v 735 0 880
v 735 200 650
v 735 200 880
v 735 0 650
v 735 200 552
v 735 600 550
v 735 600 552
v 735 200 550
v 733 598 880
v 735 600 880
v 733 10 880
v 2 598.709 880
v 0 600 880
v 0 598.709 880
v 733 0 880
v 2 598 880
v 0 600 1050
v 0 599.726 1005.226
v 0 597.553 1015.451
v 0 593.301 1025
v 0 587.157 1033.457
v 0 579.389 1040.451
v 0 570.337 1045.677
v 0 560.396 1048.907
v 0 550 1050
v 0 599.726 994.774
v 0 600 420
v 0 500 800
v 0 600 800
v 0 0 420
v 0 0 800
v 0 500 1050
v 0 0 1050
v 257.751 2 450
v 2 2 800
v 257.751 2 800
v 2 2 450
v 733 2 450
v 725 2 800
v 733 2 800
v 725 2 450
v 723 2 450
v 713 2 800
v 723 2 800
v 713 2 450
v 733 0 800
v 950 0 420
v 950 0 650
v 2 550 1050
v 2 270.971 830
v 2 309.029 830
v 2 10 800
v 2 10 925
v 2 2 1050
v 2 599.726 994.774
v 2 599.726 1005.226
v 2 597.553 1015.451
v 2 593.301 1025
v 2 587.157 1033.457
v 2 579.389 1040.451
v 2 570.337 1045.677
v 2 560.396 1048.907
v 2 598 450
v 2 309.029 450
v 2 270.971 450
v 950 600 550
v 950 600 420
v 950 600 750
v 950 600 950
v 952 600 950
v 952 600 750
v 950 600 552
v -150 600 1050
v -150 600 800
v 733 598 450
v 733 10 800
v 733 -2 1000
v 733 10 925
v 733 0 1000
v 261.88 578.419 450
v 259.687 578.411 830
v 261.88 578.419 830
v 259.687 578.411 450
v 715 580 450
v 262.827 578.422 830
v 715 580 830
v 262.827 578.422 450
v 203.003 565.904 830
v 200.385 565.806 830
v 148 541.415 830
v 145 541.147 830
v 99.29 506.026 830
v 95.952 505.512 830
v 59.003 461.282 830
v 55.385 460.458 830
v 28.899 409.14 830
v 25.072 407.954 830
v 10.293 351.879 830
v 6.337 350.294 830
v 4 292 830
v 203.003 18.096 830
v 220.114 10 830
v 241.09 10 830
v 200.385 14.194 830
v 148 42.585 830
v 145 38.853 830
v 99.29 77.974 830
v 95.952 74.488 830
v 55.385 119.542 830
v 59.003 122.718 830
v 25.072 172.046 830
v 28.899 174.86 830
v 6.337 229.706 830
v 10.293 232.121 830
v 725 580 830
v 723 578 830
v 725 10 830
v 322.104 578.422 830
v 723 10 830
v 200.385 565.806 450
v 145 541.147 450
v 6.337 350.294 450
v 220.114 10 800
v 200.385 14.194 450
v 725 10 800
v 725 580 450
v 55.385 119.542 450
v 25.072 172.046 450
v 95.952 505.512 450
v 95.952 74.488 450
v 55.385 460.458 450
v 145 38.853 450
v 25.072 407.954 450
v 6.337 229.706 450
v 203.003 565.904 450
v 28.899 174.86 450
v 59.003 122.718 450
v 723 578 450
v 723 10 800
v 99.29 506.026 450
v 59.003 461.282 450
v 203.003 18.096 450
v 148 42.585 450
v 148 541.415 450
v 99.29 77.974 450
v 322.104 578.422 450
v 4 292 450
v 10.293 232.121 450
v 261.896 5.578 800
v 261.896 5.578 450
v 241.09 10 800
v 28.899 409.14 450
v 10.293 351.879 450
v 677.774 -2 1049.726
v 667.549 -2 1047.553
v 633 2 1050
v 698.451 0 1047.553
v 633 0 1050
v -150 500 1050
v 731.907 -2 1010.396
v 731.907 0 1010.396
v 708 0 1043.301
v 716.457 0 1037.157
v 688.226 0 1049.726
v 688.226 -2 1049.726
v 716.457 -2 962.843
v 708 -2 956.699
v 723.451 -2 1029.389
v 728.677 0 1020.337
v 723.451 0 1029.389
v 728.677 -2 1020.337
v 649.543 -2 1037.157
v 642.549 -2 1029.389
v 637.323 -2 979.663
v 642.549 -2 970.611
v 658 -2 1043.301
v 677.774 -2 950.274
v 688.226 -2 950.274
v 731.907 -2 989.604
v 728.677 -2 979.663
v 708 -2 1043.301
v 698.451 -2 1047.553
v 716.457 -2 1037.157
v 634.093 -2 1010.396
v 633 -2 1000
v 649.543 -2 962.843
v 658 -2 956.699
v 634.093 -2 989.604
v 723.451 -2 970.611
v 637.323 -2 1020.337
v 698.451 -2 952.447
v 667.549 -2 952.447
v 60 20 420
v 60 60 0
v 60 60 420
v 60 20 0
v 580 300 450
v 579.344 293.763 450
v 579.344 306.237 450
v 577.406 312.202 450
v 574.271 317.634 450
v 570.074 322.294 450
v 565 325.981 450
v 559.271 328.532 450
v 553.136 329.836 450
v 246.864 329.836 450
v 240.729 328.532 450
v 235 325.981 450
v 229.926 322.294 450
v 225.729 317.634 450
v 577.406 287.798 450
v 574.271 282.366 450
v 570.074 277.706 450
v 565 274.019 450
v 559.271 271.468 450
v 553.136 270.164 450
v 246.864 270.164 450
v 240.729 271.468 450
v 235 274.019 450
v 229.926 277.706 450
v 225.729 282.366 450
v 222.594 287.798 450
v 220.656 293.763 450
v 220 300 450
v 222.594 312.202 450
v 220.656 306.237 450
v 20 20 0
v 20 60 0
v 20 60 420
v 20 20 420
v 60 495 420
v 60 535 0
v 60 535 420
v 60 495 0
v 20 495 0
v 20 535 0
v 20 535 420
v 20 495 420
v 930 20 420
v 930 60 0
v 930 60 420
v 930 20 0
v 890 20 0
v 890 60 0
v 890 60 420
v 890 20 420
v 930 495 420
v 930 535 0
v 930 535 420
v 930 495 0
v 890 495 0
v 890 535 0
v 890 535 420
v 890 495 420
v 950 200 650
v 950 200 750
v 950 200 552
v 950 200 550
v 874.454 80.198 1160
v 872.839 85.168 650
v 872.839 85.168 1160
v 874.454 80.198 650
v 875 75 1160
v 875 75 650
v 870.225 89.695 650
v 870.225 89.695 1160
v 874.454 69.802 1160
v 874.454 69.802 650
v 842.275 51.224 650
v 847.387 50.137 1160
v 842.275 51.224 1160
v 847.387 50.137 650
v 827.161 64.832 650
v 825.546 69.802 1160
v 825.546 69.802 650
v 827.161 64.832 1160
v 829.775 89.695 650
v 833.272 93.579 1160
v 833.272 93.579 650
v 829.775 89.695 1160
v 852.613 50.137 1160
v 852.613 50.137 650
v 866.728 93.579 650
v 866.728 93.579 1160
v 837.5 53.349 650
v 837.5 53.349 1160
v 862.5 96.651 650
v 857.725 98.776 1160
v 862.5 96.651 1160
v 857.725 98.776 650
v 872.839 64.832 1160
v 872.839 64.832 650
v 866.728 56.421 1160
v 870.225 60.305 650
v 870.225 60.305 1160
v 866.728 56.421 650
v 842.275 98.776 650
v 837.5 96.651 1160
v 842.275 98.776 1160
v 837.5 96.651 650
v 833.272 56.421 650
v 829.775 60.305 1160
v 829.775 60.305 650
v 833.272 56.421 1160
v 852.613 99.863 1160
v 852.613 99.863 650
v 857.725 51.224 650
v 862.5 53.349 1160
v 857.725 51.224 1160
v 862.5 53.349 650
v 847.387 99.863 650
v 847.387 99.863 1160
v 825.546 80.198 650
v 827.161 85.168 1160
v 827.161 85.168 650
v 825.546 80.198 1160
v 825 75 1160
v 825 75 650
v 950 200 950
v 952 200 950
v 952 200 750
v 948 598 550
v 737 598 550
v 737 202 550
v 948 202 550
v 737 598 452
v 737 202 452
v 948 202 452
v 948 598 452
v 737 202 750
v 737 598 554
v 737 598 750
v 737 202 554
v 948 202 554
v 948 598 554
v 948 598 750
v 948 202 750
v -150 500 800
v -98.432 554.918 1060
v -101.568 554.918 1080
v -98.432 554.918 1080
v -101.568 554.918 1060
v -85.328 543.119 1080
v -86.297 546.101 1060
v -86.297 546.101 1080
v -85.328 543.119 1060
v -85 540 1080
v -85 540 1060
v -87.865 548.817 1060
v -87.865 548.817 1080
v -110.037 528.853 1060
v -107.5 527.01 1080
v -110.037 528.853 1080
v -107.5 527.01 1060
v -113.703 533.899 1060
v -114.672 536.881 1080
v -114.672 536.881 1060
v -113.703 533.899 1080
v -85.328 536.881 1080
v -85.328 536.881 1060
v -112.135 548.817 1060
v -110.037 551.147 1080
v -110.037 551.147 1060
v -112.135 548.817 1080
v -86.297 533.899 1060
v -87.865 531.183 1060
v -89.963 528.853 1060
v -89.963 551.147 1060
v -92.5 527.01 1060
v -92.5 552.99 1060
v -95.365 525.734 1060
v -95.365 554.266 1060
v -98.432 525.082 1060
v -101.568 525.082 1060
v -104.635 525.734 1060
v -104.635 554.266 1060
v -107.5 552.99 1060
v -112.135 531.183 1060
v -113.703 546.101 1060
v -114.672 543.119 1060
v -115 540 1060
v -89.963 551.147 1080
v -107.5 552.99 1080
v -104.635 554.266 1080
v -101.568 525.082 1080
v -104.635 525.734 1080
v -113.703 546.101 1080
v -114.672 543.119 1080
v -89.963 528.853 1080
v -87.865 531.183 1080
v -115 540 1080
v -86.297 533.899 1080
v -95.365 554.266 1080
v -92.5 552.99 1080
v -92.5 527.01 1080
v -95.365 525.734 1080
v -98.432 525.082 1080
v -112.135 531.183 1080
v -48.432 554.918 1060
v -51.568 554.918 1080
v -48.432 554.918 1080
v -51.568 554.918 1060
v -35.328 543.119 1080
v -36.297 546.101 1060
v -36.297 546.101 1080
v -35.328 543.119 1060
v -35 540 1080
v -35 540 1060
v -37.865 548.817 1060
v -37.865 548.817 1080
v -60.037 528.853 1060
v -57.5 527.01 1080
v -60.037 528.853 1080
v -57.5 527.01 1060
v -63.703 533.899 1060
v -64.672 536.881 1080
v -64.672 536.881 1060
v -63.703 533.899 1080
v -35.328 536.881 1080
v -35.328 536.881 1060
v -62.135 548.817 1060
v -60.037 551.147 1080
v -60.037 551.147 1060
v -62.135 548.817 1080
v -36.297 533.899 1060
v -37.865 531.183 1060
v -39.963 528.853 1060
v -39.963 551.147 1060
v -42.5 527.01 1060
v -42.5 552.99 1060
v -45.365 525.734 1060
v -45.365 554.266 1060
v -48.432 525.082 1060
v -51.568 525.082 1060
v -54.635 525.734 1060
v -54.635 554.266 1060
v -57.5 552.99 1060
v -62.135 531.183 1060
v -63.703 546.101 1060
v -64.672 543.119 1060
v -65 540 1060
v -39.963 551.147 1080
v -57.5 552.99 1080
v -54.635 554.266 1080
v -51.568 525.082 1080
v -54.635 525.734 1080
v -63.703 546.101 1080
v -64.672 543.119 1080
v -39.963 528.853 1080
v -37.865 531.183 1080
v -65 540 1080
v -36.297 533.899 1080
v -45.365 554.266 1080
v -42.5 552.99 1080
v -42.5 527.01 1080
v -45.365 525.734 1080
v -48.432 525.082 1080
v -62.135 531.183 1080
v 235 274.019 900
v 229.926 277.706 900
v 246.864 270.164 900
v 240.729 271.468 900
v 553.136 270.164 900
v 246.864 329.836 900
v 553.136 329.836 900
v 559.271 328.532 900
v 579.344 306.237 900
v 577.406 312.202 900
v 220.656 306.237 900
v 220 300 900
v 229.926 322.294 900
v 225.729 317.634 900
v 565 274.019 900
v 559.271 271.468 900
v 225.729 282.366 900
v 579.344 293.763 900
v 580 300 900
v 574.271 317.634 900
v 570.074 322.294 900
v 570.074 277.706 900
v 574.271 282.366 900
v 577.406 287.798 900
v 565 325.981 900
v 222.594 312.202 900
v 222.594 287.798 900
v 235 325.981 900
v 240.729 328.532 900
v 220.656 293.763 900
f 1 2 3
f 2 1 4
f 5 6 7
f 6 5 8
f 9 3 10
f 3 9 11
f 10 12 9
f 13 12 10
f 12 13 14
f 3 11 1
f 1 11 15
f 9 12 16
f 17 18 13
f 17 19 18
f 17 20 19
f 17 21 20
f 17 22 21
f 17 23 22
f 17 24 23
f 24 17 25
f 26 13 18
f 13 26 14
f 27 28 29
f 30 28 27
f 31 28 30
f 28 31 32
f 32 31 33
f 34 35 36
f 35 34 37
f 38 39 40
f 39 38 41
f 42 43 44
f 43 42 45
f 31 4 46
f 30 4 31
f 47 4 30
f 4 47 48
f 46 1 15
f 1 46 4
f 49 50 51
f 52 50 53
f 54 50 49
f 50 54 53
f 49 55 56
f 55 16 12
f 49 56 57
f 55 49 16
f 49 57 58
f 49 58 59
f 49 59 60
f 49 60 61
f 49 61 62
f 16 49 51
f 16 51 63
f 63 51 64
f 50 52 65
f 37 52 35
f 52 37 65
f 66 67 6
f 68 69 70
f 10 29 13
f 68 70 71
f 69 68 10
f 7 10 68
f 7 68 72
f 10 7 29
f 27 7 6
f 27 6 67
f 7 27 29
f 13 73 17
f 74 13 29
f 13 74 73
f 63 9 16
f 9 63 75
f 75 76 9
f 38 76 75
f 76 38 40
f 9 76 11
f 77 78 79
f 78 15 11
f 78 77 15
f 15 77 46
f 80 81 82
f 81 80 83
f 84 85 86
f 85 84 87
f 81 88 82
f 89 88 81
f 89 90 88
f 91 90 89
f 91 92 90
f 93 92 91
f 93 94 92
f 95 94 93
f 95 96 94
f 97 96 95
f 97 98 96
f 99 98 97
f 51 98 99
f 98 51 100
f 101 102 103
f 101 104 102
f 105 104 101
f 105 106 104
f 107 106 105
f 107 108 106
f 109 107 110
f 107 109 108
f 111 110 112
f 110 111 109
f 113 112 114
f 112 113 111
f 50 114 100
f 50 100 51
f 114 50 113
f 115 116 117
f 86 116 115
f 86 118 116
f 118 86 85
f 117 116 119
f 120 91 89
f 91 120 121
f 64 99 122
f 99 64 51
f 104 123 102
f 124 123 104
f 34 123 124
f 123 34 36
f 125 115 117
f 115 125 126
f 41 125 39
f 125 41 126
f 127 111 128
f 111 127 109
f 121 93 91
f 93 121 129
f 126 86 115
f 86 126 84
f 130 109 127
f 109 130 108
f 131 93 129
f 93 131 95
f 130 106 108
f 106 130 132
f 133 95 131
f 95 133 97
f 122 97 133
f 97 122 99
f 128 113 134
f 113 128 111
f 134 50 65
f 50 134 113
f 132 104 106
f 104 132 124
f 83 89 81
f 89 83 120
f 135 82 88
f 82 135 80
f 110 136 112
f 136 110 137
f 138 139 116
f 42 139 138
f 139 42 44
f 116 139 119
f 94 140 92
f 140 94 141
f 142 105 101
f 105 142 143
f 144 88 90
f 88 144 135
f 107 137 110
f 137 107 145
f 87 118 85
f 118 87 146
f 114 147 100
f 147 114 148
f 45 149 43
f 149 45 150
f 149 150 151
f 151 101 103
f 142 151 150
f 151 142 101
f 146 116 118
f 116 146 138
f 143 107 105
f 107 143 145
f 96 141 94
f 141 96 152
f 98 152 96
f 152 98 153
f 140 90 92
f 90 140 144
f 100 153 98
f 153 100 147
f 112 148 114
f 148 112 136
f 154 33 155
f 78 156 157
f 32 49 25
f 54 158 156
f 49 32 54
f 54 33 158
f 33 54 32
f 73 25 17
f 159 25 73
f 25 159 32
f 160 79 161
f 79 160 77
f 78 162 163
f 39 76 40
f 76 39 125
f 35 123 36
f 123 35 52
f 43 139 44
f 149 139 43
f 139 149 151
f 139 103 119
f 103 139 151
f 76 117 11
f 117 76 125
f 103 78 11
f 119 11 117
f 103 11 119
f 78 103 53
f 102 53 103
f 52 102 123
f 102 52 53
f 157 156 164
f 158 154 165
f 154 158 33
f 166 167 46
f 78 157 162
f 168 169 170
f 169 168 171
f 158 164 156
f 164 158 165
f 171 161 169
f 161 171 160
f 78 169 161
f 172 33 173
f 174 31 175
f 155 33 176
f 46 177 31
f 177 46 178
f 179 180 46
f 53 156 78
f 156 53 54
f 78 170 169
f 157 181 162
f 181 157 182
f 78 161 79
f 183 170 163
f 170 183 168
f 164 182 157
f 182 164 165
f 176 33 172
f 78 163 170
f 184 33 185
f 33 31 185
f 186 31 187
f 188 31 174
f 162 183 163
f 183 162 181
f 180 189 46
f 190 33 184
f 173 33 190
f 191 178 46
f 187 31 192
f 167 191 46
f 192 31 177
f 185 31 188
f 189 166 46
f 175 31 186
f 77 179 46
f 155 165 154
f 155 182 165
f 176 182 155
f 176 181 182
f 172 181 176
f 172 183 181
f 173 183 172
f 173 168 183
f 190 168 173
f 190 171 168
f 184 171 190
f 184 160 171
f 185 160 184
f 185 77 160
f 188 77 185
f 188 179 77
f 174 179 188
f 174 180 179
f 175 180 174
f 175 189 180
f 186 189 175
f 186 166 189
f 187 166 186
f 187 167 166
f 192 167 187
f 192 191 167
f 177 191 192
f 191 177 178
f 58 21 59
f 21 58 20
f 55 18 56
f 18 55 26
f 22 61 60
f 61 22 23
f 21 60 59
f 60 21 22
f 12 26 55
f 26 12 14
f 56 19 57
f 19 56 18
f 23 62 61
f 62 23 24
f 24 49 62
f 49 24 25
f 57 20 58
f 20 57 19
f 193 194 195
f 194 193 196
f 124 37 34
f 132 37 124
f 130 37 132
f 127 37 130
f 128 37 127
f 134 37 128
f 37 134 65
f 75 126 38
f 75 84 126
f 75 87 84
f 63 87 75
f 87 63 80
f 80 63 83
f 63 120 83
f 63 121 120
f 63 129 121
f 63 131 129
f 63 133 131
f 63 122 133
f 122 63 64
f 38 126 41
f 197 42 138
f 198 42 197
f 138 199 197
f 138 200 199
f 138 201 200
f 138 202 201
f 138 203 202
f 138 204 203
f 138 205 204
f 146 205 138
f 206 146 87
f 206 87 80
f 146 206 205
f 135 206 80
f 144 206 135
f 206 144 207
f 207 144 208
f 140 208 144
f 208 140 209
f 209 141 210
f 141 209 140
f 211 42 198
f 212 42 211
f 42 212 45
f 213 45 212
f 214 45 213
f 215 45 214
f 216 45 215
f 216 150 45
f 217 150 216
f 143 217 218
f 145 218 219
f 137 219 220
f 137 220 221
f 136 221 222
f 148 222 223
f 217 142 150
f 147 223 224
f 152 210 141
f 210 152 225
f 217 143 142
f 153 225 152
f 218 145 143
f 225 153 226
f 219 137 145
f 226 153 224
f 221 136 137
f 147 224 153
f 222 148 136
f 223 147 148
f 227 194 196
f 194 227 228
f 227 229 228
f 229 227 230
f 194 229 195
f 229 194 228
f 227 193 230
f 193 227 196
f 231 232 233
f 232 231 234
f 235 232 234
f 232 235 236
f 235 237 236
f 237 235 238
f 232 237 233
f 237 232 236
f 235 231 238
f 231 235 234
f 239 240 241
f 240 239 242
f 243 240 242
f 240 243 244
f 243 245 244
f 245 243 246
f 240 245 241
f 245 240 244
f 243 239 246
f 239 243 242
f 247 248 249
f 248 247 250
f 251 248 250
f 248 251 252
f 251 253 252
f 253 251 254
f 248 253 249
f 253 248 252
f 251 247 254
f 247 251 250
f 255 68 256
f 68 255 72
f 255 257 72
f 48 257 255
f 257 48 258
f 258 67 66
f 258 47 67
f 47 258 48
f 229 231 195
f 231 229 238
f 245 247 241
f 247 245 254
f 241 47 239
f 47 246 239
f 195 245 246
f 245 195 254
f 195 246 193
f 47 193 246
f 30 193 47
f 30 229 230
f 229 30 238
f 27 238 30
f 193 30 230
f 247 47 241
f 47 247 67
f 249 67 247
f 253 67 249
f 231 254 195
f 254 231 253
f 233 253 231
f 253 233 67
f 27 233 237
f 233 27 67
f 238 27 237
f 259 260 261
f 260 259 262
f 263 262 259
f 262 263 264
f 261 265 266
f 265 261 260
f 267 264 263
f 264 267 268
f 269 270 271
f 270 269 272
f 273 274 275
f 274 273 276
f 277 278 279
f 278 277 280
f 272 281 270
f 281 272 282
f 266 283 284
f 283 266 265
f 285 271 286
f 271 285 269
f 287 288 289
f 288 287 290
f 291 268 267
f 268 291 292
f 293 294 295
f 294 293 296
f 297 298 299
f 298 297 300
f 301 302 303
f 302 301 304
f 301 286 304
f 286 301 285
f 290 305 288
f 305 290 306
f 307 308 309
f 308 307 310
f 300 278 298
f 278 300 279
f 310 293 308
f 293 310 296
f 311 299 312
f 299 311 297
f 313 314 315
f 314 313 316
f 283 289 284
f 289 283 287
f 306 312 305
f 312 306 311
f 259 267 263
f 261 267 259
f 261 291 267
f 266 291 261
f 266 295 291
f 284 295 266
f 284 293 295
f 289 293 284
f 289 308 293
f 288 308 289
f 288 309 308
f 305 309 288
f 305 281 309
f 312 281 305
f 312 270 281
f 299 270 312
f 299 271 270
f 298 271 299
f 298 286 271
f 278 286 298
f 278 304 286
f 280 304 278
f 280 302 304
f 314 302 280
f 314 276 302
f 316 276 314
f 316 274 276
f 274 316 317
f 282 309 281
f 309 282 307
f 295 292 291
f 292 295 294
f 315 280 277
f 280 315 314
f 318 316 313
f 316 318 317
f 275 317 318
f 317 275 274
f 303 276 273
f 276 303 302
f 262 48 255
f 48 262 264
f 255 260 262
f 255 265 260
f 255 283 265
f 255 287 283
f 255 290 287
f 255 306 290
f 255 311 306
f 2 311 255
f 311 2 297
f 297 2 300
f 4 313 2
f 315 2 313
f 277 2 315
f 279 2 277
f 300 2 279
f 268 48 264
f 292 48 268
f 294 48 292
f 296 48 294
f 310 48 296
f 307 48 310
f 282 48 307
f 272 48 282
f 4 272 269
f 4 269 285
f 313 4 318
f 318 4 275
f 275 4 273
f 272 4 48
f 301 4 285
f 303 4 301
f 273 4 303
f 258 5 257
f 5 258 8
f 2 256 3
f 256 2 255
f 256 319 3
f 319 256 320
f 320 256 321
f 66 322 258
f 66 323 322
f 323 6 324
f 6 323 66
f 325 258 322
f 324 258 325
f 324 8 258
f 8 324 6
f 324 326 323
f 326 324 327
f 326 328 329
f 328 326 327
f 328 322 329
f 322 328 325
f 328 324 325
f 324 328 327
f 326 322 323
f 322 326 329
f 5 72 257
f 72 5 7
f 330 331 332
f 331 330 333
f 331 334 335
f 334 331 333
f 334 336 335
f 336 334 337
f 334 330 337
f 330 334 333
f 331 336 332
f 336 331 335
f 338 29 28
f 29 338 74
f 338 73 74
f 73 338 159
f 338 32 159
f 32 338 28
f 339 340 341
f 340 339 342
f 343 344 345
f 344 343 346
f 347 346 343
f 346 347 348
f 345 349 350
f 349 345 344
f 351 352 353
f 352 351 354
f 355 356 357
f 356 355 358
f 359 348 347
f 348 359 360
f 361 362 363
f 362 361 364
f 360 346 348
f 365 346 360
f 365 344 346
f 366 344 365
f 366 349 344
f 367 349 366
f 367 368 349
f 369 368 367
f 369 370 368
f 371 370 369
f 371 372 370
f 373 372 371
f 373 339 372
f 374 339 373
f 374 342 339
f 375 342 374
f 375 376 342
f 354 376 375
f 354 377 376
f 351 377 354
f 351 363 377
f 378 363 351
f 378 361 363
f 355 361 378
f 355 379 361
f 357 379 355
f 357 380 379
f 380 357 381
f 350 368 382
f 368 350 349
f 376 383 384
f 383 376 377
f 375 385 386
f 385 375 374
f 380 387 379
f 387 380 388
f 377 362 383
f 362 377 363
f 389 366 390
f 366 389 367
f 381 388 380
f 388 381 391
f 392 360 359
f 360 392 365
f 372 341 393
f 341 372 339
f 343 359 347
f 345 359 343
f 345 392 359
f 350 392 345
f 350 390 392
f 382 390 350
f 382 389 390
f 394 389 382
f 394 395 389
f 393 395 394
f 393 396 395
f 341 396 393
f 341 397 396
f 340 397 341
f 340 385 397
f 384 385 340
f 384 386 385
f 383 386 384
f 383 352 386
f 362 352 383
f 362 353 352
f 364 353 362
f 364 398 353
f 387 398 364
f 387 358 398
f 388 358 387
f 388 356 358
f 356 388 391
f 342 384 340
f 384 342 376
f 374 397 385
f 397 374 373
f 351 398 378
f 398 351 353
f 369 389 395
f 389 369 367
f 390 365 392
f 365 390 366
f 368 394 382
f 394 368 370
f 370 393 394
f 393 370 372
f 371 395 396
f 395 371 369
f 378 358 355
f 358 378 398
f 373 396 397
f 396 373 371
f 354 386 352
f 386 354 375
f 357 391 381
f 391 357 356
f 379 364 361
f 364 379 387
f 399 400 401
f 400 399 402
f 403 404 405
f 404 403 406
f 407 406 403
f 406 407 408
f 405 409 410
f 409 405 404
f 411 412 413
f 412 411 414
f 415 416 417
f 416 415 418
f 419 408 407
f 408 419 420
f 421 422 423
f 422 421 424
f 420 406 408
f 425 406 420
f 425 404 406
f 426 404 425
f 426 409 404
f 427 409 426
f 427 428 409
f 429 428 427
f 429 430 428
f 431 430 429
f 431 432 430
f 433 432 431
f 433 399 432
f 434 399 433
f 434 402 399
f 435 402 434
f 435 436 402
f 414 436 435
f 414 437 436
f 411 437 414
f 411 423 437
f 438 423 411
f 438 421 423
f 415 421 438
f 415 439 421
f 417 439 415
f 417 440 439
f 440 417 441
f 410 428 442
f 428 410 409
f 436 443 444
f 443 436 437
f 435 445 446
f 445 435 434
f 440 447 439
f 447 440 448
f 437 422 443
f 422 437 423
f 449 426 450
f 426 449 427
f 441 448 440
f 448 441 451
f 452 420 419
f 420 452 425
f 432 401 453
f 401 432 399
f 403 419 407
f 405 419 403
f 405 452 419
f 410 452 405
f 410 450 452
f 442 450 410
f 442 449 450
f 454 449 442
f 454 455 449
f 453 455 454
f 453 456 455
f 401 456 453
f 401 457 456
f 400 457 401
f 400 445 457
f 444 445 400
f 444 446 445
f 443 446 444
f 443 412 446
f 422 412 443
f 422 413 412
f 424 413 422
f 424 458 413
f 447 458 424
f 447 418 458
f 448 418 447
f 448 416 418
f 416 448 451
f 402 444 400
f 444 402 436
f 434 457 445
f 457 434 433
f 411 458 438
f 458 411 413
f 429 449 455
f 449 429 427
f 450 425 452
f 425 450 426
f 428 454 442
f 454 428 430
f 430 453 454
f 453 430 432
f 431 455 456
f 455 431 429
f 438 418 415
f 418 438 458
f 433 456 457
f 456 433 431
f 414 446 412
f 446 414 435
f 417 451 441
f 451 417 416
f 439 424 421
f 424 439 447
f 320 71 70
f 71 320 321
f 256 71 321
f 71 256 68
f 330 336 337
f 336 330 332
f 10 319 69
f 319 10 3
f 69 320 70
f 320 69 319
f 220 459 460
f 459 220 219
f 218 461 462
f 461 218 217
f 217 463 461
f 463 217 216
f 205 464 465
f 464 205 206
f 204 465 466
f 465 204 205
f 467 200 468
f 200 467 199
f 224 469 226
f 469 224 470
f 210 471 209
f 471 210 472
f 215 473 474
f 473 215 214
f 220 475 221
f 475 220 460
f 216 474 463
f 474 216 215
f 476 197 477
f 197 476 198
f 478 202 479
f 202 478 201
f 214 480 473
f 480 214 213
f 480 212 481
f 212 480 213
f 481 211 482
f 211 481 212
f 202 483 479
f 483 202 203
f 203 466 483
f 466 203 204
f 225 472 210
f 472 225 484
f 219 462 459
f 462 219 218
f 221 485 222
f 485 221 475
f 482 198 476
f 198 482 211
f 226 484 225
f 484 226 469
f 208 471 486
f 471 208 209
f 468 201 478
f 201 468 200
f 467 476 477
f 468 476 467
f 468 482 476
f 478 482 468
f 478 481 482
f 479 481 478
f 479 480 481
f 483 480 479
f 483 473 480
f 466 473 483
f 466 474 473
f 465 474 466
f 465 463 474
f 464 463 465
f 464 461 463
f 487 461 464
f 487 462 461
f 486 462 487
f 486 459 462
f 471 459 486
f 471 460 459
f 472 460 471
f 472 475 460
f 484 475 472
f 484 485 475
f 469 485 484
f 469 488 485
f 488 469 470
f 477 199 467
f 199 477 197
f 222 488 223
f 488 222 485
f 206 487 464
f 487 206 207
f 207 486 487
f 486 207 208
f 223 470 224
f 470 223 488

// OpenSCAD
maruzen_rotary_fryer();
module maruzen_rotary_fryer(){
  translate([0,0,430]) fryer_body();
  translate([0,0,430]) fryer_oilpan();
  translate([0,0,800]) fryer_oilshield();
  fryer_base();
  control_box();
  translate([950, 600, 450])rotate([0,0,180])fryer_oilbox();
  translate([950-215, 200, 450+300]) food_basket();
  translate([0,0,450]) color("dimgray")rotary_plate();
  translate([-150, 500, 800]) fryer_controller();
}

module fryer_body(){
  color("silver"){
    cube([735, 2, 450]);
    cube([2, 600, 450]);
    translate([0,600-2,0]) cube([735,2,450]);
    translate([735-2,0]) cube([2,600, 450]);
  }
}

module fryer_oilpan(){
  color("silver"){
  difference(){
    hull(){
      translate([290,290,0])cylinder(h=400, r=290);
      translate([735-20, 0,0]) cube([10, 580, 400]);
    }
    hull(){
      translate([290+2,290+2,2])cylinder(h=400, r=290-2);
      translate([735-20-2, 2,2]) cube([10, 580-4, 400]);
    }
  }
  }
}

module fryer_oilshield(){
  filet=50;
  color("silver"){
  hull(){
    translate([0,0,0])cube([733-filet *2,2, 250]);
    translate([0,0,0])cube([733, 10, 125]);
    translate([733-filet, 0, 250-filet])rotate([90,0,0])cylinder(h=2, r=filet);
  }
  hull(){
    translate([0,0,0])cube([2,600-filet*2-2, 250]);
    translate([0,0,0])cube([2, 600-2, 125]);
    translate([0, 600-filet, 250-filet])rotate([0,90,0])cylinder(h=2, r=filet);
  }
  }
}

module fryer_base(){
  color("silver"){
  translate([0,0,450-30])cube([950, 600, 30]);
  for(i=[0:870:950]){
    translate([i+20, 20, 0])cube([40,40,450]);
    translate([i+20, 600-85-20, 0])cube([40,40,450]);
  }
  }
}

module control_box(){
  color("silver") {
    translate([950-100, 75, 450])cylinder(h=1400-450-240, r=25);
    translate([950-215, 0, 450]) cube([215, 200,200]);
  }
}

module fryer_oilbox(){
  color("silver"){
    translate([0,0,0]) drawer(215, 400, 100);
    translate([0,0,102]) drawer(215, 400, 200);
  }
}

module drawer(x, y, z) {
  t=2;
  difference(){
    translate([0,0,0]) cube([x,y,z]);
    translate([t,t,t]) cube([x-t*2, y-t*2, z]);
  }
}

module fryer_controller(){
  color("silver") {
    cube([150, 100, 250]);
    translate([50, 40, 260]) cylinder(h=20, r=15);
    translate([100, 40, 260]) cylinder(h=20, r=15);
  }
}

module food_basket(){
  t=2; 
  color("whitesmoke")
  difference(){
    hull(){
      translate([0,0,0]) cube([t, 400, 130]);
      translate([215,0,0]) cube([t, 400, 200]);
    }
  }
}

module rotary_plate(){
  t=2;
  hull(){
    translate([250, 300, 0]) cylinder(h=450, r=30);
    translate([550, 300, 0]) cylinder(h=450, r=30);
  }
}
